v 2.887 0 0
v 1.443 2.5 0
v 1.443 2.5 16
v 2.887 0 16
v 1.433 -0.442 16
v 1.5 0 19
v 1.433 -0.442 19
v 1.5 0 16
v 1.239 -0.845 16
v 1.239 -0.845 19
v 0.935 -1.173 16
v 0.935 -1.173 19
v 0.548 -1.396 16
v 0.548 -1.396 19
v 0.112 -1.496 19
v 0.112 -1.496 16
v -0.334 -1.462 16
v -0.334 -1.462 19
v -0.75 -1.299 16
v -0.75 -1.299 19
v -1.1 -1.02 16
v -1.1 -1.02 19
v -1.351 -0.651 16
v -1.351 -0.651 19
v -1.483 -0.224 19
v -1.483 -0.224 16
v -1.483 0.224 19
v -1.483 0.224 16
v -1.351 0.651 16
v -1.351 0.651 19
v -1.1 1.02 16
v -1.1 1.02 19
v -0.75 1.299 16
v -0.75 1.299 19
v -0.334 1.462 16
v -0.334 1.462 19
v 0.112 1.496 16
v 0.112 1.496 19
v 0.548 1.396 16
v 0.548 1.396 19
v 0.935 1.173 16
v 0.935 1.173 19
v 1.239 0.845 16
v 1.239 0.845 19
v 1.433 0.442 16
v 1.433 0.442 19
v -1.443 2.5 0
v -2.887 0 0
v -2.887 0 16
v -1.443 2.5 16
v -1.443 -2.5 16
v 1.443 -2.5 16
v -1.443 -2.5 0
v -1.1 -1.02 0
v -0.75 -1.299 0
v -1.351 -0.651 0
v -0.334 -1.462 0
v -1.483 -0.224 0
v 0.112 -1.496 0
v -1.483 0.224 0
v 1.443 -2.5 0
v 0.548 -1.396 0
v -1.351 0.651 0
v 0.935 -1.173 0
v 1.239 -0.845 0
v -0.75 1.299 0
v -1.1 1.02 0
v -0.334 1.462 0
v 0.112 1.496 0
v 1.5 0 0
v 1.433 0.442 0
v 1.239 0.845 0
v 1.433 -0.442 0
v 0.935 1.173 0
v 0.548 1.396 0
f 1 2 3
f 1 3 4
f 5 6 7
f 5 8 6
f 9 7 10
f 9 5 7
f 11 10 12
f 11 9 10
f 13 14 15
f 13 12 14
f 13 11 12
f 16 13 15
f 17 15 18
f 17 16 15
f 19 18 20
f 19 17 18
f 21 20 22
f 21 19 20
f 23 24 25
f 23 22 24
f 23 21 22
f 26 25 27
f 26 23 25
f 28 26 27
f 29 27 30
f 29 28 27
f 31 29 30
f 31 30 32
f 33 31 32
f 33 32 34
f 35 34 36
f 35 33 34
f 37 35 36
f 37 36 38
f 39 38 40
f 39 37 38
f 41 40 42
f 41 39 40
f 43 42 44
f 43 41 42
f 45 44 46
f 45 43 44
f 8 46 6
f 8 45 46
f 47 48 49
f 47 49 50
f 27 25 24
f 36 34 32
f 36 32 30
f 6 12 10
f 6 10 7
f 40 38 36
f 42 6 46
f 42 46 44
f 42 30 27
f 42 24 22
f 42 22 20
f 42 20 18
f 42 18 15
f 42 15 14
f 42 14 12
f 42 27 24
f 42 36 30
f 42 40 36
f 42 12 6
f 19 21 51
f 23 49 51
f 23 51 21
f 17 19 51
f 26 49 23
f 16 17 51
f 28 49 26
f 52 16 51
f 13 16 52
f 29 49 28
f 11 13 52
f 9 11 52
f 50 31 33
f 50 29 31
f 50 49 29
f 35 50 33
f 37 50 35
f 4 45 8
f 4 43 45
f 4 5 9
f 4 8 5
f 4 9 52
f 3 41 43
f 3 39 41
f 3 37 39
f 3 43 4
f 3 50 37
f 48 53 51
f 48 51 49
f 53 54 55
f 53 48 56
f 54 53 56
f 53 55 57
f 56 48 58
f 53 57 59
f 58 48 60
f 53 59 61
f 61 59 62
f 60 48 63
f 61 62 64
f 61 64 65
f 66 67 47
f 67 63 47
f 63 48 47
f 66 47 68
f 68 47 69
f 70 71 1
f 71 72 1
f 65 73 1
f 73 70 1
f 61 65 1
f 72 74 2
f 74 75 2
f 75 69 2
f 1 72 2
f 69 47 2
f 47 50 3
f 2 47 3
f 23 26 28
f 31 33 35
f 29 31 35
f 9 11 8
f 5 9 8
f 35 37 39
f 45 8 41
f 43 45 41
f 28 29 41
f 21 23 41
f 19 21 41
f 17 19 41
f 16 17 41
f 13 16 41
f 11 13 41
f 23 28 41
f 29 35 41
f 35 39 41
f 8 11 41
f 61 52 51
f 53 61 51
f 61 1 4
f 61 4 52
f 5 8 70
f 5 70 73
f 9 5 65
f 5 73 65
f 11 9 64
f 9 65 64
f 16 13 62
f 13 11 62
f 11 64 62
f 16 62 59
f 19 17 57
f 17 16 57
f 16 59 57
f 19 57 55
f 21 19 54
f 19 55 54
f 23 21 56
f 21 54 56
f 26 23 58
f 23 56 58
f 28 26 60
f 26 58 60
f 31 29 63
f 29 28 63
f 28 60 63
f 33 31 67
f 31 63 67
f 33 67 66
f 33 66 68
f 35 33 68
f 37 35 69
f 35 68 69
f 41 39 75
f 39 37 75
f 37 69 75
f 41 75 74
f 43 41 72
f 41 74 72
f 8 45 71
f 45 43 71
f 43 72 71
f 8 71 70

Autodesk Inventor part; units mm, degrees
ref_plane "YZ Plane" through (0, 0, 0) normal (1, 0, 0) x (0, 1, 0)
ref_plane "XZ Plane" through (0, 0, 0) normal (0, 1, 0) x (-1, 0, 0)
ref_plane "XY Plane" through (0, 0, 0) normal (0, 0, 1) x (1, 0, 0)
sketch "Sketch1" plane through (0, 0, 0) normal (0, 0, 1) x (1, 0, 0)
  line L0 (1.4434, 2.5) -> (2.8868, 0)
  line L1 (2.8868, 0) -> (1.4434, -2.5)
  line L2 (1.4434, -2.5) -> (-1.4434, -2.5)
  line L3 (-1.4434, -2.5) -> (-2.8868, 0)
  line L4 (-2.8868, 0) -> (-1.4434, 2.5)
  line L5 (-1.4434, 2.5) -> (1.4434, 2.5)
  circle A0 centre (0, 0) radius 1.5
  dimension "d0" = 5
  dimension "d1" = 3
extrude "Extrusion1" add sketch "Sketch1" along normal blind 16
sketch "Sketch2" plane through (0, 0, 16) normal (0, 0, 1) x (1, 0, 0)
  circle A0 centre (0, 0) radius 1.5 projected
extrude "Extrusion2" add sketch "Sketch2" along normal blind 3
properties part number "Spacer_9mm" material "Brass, Soft Yellow"
